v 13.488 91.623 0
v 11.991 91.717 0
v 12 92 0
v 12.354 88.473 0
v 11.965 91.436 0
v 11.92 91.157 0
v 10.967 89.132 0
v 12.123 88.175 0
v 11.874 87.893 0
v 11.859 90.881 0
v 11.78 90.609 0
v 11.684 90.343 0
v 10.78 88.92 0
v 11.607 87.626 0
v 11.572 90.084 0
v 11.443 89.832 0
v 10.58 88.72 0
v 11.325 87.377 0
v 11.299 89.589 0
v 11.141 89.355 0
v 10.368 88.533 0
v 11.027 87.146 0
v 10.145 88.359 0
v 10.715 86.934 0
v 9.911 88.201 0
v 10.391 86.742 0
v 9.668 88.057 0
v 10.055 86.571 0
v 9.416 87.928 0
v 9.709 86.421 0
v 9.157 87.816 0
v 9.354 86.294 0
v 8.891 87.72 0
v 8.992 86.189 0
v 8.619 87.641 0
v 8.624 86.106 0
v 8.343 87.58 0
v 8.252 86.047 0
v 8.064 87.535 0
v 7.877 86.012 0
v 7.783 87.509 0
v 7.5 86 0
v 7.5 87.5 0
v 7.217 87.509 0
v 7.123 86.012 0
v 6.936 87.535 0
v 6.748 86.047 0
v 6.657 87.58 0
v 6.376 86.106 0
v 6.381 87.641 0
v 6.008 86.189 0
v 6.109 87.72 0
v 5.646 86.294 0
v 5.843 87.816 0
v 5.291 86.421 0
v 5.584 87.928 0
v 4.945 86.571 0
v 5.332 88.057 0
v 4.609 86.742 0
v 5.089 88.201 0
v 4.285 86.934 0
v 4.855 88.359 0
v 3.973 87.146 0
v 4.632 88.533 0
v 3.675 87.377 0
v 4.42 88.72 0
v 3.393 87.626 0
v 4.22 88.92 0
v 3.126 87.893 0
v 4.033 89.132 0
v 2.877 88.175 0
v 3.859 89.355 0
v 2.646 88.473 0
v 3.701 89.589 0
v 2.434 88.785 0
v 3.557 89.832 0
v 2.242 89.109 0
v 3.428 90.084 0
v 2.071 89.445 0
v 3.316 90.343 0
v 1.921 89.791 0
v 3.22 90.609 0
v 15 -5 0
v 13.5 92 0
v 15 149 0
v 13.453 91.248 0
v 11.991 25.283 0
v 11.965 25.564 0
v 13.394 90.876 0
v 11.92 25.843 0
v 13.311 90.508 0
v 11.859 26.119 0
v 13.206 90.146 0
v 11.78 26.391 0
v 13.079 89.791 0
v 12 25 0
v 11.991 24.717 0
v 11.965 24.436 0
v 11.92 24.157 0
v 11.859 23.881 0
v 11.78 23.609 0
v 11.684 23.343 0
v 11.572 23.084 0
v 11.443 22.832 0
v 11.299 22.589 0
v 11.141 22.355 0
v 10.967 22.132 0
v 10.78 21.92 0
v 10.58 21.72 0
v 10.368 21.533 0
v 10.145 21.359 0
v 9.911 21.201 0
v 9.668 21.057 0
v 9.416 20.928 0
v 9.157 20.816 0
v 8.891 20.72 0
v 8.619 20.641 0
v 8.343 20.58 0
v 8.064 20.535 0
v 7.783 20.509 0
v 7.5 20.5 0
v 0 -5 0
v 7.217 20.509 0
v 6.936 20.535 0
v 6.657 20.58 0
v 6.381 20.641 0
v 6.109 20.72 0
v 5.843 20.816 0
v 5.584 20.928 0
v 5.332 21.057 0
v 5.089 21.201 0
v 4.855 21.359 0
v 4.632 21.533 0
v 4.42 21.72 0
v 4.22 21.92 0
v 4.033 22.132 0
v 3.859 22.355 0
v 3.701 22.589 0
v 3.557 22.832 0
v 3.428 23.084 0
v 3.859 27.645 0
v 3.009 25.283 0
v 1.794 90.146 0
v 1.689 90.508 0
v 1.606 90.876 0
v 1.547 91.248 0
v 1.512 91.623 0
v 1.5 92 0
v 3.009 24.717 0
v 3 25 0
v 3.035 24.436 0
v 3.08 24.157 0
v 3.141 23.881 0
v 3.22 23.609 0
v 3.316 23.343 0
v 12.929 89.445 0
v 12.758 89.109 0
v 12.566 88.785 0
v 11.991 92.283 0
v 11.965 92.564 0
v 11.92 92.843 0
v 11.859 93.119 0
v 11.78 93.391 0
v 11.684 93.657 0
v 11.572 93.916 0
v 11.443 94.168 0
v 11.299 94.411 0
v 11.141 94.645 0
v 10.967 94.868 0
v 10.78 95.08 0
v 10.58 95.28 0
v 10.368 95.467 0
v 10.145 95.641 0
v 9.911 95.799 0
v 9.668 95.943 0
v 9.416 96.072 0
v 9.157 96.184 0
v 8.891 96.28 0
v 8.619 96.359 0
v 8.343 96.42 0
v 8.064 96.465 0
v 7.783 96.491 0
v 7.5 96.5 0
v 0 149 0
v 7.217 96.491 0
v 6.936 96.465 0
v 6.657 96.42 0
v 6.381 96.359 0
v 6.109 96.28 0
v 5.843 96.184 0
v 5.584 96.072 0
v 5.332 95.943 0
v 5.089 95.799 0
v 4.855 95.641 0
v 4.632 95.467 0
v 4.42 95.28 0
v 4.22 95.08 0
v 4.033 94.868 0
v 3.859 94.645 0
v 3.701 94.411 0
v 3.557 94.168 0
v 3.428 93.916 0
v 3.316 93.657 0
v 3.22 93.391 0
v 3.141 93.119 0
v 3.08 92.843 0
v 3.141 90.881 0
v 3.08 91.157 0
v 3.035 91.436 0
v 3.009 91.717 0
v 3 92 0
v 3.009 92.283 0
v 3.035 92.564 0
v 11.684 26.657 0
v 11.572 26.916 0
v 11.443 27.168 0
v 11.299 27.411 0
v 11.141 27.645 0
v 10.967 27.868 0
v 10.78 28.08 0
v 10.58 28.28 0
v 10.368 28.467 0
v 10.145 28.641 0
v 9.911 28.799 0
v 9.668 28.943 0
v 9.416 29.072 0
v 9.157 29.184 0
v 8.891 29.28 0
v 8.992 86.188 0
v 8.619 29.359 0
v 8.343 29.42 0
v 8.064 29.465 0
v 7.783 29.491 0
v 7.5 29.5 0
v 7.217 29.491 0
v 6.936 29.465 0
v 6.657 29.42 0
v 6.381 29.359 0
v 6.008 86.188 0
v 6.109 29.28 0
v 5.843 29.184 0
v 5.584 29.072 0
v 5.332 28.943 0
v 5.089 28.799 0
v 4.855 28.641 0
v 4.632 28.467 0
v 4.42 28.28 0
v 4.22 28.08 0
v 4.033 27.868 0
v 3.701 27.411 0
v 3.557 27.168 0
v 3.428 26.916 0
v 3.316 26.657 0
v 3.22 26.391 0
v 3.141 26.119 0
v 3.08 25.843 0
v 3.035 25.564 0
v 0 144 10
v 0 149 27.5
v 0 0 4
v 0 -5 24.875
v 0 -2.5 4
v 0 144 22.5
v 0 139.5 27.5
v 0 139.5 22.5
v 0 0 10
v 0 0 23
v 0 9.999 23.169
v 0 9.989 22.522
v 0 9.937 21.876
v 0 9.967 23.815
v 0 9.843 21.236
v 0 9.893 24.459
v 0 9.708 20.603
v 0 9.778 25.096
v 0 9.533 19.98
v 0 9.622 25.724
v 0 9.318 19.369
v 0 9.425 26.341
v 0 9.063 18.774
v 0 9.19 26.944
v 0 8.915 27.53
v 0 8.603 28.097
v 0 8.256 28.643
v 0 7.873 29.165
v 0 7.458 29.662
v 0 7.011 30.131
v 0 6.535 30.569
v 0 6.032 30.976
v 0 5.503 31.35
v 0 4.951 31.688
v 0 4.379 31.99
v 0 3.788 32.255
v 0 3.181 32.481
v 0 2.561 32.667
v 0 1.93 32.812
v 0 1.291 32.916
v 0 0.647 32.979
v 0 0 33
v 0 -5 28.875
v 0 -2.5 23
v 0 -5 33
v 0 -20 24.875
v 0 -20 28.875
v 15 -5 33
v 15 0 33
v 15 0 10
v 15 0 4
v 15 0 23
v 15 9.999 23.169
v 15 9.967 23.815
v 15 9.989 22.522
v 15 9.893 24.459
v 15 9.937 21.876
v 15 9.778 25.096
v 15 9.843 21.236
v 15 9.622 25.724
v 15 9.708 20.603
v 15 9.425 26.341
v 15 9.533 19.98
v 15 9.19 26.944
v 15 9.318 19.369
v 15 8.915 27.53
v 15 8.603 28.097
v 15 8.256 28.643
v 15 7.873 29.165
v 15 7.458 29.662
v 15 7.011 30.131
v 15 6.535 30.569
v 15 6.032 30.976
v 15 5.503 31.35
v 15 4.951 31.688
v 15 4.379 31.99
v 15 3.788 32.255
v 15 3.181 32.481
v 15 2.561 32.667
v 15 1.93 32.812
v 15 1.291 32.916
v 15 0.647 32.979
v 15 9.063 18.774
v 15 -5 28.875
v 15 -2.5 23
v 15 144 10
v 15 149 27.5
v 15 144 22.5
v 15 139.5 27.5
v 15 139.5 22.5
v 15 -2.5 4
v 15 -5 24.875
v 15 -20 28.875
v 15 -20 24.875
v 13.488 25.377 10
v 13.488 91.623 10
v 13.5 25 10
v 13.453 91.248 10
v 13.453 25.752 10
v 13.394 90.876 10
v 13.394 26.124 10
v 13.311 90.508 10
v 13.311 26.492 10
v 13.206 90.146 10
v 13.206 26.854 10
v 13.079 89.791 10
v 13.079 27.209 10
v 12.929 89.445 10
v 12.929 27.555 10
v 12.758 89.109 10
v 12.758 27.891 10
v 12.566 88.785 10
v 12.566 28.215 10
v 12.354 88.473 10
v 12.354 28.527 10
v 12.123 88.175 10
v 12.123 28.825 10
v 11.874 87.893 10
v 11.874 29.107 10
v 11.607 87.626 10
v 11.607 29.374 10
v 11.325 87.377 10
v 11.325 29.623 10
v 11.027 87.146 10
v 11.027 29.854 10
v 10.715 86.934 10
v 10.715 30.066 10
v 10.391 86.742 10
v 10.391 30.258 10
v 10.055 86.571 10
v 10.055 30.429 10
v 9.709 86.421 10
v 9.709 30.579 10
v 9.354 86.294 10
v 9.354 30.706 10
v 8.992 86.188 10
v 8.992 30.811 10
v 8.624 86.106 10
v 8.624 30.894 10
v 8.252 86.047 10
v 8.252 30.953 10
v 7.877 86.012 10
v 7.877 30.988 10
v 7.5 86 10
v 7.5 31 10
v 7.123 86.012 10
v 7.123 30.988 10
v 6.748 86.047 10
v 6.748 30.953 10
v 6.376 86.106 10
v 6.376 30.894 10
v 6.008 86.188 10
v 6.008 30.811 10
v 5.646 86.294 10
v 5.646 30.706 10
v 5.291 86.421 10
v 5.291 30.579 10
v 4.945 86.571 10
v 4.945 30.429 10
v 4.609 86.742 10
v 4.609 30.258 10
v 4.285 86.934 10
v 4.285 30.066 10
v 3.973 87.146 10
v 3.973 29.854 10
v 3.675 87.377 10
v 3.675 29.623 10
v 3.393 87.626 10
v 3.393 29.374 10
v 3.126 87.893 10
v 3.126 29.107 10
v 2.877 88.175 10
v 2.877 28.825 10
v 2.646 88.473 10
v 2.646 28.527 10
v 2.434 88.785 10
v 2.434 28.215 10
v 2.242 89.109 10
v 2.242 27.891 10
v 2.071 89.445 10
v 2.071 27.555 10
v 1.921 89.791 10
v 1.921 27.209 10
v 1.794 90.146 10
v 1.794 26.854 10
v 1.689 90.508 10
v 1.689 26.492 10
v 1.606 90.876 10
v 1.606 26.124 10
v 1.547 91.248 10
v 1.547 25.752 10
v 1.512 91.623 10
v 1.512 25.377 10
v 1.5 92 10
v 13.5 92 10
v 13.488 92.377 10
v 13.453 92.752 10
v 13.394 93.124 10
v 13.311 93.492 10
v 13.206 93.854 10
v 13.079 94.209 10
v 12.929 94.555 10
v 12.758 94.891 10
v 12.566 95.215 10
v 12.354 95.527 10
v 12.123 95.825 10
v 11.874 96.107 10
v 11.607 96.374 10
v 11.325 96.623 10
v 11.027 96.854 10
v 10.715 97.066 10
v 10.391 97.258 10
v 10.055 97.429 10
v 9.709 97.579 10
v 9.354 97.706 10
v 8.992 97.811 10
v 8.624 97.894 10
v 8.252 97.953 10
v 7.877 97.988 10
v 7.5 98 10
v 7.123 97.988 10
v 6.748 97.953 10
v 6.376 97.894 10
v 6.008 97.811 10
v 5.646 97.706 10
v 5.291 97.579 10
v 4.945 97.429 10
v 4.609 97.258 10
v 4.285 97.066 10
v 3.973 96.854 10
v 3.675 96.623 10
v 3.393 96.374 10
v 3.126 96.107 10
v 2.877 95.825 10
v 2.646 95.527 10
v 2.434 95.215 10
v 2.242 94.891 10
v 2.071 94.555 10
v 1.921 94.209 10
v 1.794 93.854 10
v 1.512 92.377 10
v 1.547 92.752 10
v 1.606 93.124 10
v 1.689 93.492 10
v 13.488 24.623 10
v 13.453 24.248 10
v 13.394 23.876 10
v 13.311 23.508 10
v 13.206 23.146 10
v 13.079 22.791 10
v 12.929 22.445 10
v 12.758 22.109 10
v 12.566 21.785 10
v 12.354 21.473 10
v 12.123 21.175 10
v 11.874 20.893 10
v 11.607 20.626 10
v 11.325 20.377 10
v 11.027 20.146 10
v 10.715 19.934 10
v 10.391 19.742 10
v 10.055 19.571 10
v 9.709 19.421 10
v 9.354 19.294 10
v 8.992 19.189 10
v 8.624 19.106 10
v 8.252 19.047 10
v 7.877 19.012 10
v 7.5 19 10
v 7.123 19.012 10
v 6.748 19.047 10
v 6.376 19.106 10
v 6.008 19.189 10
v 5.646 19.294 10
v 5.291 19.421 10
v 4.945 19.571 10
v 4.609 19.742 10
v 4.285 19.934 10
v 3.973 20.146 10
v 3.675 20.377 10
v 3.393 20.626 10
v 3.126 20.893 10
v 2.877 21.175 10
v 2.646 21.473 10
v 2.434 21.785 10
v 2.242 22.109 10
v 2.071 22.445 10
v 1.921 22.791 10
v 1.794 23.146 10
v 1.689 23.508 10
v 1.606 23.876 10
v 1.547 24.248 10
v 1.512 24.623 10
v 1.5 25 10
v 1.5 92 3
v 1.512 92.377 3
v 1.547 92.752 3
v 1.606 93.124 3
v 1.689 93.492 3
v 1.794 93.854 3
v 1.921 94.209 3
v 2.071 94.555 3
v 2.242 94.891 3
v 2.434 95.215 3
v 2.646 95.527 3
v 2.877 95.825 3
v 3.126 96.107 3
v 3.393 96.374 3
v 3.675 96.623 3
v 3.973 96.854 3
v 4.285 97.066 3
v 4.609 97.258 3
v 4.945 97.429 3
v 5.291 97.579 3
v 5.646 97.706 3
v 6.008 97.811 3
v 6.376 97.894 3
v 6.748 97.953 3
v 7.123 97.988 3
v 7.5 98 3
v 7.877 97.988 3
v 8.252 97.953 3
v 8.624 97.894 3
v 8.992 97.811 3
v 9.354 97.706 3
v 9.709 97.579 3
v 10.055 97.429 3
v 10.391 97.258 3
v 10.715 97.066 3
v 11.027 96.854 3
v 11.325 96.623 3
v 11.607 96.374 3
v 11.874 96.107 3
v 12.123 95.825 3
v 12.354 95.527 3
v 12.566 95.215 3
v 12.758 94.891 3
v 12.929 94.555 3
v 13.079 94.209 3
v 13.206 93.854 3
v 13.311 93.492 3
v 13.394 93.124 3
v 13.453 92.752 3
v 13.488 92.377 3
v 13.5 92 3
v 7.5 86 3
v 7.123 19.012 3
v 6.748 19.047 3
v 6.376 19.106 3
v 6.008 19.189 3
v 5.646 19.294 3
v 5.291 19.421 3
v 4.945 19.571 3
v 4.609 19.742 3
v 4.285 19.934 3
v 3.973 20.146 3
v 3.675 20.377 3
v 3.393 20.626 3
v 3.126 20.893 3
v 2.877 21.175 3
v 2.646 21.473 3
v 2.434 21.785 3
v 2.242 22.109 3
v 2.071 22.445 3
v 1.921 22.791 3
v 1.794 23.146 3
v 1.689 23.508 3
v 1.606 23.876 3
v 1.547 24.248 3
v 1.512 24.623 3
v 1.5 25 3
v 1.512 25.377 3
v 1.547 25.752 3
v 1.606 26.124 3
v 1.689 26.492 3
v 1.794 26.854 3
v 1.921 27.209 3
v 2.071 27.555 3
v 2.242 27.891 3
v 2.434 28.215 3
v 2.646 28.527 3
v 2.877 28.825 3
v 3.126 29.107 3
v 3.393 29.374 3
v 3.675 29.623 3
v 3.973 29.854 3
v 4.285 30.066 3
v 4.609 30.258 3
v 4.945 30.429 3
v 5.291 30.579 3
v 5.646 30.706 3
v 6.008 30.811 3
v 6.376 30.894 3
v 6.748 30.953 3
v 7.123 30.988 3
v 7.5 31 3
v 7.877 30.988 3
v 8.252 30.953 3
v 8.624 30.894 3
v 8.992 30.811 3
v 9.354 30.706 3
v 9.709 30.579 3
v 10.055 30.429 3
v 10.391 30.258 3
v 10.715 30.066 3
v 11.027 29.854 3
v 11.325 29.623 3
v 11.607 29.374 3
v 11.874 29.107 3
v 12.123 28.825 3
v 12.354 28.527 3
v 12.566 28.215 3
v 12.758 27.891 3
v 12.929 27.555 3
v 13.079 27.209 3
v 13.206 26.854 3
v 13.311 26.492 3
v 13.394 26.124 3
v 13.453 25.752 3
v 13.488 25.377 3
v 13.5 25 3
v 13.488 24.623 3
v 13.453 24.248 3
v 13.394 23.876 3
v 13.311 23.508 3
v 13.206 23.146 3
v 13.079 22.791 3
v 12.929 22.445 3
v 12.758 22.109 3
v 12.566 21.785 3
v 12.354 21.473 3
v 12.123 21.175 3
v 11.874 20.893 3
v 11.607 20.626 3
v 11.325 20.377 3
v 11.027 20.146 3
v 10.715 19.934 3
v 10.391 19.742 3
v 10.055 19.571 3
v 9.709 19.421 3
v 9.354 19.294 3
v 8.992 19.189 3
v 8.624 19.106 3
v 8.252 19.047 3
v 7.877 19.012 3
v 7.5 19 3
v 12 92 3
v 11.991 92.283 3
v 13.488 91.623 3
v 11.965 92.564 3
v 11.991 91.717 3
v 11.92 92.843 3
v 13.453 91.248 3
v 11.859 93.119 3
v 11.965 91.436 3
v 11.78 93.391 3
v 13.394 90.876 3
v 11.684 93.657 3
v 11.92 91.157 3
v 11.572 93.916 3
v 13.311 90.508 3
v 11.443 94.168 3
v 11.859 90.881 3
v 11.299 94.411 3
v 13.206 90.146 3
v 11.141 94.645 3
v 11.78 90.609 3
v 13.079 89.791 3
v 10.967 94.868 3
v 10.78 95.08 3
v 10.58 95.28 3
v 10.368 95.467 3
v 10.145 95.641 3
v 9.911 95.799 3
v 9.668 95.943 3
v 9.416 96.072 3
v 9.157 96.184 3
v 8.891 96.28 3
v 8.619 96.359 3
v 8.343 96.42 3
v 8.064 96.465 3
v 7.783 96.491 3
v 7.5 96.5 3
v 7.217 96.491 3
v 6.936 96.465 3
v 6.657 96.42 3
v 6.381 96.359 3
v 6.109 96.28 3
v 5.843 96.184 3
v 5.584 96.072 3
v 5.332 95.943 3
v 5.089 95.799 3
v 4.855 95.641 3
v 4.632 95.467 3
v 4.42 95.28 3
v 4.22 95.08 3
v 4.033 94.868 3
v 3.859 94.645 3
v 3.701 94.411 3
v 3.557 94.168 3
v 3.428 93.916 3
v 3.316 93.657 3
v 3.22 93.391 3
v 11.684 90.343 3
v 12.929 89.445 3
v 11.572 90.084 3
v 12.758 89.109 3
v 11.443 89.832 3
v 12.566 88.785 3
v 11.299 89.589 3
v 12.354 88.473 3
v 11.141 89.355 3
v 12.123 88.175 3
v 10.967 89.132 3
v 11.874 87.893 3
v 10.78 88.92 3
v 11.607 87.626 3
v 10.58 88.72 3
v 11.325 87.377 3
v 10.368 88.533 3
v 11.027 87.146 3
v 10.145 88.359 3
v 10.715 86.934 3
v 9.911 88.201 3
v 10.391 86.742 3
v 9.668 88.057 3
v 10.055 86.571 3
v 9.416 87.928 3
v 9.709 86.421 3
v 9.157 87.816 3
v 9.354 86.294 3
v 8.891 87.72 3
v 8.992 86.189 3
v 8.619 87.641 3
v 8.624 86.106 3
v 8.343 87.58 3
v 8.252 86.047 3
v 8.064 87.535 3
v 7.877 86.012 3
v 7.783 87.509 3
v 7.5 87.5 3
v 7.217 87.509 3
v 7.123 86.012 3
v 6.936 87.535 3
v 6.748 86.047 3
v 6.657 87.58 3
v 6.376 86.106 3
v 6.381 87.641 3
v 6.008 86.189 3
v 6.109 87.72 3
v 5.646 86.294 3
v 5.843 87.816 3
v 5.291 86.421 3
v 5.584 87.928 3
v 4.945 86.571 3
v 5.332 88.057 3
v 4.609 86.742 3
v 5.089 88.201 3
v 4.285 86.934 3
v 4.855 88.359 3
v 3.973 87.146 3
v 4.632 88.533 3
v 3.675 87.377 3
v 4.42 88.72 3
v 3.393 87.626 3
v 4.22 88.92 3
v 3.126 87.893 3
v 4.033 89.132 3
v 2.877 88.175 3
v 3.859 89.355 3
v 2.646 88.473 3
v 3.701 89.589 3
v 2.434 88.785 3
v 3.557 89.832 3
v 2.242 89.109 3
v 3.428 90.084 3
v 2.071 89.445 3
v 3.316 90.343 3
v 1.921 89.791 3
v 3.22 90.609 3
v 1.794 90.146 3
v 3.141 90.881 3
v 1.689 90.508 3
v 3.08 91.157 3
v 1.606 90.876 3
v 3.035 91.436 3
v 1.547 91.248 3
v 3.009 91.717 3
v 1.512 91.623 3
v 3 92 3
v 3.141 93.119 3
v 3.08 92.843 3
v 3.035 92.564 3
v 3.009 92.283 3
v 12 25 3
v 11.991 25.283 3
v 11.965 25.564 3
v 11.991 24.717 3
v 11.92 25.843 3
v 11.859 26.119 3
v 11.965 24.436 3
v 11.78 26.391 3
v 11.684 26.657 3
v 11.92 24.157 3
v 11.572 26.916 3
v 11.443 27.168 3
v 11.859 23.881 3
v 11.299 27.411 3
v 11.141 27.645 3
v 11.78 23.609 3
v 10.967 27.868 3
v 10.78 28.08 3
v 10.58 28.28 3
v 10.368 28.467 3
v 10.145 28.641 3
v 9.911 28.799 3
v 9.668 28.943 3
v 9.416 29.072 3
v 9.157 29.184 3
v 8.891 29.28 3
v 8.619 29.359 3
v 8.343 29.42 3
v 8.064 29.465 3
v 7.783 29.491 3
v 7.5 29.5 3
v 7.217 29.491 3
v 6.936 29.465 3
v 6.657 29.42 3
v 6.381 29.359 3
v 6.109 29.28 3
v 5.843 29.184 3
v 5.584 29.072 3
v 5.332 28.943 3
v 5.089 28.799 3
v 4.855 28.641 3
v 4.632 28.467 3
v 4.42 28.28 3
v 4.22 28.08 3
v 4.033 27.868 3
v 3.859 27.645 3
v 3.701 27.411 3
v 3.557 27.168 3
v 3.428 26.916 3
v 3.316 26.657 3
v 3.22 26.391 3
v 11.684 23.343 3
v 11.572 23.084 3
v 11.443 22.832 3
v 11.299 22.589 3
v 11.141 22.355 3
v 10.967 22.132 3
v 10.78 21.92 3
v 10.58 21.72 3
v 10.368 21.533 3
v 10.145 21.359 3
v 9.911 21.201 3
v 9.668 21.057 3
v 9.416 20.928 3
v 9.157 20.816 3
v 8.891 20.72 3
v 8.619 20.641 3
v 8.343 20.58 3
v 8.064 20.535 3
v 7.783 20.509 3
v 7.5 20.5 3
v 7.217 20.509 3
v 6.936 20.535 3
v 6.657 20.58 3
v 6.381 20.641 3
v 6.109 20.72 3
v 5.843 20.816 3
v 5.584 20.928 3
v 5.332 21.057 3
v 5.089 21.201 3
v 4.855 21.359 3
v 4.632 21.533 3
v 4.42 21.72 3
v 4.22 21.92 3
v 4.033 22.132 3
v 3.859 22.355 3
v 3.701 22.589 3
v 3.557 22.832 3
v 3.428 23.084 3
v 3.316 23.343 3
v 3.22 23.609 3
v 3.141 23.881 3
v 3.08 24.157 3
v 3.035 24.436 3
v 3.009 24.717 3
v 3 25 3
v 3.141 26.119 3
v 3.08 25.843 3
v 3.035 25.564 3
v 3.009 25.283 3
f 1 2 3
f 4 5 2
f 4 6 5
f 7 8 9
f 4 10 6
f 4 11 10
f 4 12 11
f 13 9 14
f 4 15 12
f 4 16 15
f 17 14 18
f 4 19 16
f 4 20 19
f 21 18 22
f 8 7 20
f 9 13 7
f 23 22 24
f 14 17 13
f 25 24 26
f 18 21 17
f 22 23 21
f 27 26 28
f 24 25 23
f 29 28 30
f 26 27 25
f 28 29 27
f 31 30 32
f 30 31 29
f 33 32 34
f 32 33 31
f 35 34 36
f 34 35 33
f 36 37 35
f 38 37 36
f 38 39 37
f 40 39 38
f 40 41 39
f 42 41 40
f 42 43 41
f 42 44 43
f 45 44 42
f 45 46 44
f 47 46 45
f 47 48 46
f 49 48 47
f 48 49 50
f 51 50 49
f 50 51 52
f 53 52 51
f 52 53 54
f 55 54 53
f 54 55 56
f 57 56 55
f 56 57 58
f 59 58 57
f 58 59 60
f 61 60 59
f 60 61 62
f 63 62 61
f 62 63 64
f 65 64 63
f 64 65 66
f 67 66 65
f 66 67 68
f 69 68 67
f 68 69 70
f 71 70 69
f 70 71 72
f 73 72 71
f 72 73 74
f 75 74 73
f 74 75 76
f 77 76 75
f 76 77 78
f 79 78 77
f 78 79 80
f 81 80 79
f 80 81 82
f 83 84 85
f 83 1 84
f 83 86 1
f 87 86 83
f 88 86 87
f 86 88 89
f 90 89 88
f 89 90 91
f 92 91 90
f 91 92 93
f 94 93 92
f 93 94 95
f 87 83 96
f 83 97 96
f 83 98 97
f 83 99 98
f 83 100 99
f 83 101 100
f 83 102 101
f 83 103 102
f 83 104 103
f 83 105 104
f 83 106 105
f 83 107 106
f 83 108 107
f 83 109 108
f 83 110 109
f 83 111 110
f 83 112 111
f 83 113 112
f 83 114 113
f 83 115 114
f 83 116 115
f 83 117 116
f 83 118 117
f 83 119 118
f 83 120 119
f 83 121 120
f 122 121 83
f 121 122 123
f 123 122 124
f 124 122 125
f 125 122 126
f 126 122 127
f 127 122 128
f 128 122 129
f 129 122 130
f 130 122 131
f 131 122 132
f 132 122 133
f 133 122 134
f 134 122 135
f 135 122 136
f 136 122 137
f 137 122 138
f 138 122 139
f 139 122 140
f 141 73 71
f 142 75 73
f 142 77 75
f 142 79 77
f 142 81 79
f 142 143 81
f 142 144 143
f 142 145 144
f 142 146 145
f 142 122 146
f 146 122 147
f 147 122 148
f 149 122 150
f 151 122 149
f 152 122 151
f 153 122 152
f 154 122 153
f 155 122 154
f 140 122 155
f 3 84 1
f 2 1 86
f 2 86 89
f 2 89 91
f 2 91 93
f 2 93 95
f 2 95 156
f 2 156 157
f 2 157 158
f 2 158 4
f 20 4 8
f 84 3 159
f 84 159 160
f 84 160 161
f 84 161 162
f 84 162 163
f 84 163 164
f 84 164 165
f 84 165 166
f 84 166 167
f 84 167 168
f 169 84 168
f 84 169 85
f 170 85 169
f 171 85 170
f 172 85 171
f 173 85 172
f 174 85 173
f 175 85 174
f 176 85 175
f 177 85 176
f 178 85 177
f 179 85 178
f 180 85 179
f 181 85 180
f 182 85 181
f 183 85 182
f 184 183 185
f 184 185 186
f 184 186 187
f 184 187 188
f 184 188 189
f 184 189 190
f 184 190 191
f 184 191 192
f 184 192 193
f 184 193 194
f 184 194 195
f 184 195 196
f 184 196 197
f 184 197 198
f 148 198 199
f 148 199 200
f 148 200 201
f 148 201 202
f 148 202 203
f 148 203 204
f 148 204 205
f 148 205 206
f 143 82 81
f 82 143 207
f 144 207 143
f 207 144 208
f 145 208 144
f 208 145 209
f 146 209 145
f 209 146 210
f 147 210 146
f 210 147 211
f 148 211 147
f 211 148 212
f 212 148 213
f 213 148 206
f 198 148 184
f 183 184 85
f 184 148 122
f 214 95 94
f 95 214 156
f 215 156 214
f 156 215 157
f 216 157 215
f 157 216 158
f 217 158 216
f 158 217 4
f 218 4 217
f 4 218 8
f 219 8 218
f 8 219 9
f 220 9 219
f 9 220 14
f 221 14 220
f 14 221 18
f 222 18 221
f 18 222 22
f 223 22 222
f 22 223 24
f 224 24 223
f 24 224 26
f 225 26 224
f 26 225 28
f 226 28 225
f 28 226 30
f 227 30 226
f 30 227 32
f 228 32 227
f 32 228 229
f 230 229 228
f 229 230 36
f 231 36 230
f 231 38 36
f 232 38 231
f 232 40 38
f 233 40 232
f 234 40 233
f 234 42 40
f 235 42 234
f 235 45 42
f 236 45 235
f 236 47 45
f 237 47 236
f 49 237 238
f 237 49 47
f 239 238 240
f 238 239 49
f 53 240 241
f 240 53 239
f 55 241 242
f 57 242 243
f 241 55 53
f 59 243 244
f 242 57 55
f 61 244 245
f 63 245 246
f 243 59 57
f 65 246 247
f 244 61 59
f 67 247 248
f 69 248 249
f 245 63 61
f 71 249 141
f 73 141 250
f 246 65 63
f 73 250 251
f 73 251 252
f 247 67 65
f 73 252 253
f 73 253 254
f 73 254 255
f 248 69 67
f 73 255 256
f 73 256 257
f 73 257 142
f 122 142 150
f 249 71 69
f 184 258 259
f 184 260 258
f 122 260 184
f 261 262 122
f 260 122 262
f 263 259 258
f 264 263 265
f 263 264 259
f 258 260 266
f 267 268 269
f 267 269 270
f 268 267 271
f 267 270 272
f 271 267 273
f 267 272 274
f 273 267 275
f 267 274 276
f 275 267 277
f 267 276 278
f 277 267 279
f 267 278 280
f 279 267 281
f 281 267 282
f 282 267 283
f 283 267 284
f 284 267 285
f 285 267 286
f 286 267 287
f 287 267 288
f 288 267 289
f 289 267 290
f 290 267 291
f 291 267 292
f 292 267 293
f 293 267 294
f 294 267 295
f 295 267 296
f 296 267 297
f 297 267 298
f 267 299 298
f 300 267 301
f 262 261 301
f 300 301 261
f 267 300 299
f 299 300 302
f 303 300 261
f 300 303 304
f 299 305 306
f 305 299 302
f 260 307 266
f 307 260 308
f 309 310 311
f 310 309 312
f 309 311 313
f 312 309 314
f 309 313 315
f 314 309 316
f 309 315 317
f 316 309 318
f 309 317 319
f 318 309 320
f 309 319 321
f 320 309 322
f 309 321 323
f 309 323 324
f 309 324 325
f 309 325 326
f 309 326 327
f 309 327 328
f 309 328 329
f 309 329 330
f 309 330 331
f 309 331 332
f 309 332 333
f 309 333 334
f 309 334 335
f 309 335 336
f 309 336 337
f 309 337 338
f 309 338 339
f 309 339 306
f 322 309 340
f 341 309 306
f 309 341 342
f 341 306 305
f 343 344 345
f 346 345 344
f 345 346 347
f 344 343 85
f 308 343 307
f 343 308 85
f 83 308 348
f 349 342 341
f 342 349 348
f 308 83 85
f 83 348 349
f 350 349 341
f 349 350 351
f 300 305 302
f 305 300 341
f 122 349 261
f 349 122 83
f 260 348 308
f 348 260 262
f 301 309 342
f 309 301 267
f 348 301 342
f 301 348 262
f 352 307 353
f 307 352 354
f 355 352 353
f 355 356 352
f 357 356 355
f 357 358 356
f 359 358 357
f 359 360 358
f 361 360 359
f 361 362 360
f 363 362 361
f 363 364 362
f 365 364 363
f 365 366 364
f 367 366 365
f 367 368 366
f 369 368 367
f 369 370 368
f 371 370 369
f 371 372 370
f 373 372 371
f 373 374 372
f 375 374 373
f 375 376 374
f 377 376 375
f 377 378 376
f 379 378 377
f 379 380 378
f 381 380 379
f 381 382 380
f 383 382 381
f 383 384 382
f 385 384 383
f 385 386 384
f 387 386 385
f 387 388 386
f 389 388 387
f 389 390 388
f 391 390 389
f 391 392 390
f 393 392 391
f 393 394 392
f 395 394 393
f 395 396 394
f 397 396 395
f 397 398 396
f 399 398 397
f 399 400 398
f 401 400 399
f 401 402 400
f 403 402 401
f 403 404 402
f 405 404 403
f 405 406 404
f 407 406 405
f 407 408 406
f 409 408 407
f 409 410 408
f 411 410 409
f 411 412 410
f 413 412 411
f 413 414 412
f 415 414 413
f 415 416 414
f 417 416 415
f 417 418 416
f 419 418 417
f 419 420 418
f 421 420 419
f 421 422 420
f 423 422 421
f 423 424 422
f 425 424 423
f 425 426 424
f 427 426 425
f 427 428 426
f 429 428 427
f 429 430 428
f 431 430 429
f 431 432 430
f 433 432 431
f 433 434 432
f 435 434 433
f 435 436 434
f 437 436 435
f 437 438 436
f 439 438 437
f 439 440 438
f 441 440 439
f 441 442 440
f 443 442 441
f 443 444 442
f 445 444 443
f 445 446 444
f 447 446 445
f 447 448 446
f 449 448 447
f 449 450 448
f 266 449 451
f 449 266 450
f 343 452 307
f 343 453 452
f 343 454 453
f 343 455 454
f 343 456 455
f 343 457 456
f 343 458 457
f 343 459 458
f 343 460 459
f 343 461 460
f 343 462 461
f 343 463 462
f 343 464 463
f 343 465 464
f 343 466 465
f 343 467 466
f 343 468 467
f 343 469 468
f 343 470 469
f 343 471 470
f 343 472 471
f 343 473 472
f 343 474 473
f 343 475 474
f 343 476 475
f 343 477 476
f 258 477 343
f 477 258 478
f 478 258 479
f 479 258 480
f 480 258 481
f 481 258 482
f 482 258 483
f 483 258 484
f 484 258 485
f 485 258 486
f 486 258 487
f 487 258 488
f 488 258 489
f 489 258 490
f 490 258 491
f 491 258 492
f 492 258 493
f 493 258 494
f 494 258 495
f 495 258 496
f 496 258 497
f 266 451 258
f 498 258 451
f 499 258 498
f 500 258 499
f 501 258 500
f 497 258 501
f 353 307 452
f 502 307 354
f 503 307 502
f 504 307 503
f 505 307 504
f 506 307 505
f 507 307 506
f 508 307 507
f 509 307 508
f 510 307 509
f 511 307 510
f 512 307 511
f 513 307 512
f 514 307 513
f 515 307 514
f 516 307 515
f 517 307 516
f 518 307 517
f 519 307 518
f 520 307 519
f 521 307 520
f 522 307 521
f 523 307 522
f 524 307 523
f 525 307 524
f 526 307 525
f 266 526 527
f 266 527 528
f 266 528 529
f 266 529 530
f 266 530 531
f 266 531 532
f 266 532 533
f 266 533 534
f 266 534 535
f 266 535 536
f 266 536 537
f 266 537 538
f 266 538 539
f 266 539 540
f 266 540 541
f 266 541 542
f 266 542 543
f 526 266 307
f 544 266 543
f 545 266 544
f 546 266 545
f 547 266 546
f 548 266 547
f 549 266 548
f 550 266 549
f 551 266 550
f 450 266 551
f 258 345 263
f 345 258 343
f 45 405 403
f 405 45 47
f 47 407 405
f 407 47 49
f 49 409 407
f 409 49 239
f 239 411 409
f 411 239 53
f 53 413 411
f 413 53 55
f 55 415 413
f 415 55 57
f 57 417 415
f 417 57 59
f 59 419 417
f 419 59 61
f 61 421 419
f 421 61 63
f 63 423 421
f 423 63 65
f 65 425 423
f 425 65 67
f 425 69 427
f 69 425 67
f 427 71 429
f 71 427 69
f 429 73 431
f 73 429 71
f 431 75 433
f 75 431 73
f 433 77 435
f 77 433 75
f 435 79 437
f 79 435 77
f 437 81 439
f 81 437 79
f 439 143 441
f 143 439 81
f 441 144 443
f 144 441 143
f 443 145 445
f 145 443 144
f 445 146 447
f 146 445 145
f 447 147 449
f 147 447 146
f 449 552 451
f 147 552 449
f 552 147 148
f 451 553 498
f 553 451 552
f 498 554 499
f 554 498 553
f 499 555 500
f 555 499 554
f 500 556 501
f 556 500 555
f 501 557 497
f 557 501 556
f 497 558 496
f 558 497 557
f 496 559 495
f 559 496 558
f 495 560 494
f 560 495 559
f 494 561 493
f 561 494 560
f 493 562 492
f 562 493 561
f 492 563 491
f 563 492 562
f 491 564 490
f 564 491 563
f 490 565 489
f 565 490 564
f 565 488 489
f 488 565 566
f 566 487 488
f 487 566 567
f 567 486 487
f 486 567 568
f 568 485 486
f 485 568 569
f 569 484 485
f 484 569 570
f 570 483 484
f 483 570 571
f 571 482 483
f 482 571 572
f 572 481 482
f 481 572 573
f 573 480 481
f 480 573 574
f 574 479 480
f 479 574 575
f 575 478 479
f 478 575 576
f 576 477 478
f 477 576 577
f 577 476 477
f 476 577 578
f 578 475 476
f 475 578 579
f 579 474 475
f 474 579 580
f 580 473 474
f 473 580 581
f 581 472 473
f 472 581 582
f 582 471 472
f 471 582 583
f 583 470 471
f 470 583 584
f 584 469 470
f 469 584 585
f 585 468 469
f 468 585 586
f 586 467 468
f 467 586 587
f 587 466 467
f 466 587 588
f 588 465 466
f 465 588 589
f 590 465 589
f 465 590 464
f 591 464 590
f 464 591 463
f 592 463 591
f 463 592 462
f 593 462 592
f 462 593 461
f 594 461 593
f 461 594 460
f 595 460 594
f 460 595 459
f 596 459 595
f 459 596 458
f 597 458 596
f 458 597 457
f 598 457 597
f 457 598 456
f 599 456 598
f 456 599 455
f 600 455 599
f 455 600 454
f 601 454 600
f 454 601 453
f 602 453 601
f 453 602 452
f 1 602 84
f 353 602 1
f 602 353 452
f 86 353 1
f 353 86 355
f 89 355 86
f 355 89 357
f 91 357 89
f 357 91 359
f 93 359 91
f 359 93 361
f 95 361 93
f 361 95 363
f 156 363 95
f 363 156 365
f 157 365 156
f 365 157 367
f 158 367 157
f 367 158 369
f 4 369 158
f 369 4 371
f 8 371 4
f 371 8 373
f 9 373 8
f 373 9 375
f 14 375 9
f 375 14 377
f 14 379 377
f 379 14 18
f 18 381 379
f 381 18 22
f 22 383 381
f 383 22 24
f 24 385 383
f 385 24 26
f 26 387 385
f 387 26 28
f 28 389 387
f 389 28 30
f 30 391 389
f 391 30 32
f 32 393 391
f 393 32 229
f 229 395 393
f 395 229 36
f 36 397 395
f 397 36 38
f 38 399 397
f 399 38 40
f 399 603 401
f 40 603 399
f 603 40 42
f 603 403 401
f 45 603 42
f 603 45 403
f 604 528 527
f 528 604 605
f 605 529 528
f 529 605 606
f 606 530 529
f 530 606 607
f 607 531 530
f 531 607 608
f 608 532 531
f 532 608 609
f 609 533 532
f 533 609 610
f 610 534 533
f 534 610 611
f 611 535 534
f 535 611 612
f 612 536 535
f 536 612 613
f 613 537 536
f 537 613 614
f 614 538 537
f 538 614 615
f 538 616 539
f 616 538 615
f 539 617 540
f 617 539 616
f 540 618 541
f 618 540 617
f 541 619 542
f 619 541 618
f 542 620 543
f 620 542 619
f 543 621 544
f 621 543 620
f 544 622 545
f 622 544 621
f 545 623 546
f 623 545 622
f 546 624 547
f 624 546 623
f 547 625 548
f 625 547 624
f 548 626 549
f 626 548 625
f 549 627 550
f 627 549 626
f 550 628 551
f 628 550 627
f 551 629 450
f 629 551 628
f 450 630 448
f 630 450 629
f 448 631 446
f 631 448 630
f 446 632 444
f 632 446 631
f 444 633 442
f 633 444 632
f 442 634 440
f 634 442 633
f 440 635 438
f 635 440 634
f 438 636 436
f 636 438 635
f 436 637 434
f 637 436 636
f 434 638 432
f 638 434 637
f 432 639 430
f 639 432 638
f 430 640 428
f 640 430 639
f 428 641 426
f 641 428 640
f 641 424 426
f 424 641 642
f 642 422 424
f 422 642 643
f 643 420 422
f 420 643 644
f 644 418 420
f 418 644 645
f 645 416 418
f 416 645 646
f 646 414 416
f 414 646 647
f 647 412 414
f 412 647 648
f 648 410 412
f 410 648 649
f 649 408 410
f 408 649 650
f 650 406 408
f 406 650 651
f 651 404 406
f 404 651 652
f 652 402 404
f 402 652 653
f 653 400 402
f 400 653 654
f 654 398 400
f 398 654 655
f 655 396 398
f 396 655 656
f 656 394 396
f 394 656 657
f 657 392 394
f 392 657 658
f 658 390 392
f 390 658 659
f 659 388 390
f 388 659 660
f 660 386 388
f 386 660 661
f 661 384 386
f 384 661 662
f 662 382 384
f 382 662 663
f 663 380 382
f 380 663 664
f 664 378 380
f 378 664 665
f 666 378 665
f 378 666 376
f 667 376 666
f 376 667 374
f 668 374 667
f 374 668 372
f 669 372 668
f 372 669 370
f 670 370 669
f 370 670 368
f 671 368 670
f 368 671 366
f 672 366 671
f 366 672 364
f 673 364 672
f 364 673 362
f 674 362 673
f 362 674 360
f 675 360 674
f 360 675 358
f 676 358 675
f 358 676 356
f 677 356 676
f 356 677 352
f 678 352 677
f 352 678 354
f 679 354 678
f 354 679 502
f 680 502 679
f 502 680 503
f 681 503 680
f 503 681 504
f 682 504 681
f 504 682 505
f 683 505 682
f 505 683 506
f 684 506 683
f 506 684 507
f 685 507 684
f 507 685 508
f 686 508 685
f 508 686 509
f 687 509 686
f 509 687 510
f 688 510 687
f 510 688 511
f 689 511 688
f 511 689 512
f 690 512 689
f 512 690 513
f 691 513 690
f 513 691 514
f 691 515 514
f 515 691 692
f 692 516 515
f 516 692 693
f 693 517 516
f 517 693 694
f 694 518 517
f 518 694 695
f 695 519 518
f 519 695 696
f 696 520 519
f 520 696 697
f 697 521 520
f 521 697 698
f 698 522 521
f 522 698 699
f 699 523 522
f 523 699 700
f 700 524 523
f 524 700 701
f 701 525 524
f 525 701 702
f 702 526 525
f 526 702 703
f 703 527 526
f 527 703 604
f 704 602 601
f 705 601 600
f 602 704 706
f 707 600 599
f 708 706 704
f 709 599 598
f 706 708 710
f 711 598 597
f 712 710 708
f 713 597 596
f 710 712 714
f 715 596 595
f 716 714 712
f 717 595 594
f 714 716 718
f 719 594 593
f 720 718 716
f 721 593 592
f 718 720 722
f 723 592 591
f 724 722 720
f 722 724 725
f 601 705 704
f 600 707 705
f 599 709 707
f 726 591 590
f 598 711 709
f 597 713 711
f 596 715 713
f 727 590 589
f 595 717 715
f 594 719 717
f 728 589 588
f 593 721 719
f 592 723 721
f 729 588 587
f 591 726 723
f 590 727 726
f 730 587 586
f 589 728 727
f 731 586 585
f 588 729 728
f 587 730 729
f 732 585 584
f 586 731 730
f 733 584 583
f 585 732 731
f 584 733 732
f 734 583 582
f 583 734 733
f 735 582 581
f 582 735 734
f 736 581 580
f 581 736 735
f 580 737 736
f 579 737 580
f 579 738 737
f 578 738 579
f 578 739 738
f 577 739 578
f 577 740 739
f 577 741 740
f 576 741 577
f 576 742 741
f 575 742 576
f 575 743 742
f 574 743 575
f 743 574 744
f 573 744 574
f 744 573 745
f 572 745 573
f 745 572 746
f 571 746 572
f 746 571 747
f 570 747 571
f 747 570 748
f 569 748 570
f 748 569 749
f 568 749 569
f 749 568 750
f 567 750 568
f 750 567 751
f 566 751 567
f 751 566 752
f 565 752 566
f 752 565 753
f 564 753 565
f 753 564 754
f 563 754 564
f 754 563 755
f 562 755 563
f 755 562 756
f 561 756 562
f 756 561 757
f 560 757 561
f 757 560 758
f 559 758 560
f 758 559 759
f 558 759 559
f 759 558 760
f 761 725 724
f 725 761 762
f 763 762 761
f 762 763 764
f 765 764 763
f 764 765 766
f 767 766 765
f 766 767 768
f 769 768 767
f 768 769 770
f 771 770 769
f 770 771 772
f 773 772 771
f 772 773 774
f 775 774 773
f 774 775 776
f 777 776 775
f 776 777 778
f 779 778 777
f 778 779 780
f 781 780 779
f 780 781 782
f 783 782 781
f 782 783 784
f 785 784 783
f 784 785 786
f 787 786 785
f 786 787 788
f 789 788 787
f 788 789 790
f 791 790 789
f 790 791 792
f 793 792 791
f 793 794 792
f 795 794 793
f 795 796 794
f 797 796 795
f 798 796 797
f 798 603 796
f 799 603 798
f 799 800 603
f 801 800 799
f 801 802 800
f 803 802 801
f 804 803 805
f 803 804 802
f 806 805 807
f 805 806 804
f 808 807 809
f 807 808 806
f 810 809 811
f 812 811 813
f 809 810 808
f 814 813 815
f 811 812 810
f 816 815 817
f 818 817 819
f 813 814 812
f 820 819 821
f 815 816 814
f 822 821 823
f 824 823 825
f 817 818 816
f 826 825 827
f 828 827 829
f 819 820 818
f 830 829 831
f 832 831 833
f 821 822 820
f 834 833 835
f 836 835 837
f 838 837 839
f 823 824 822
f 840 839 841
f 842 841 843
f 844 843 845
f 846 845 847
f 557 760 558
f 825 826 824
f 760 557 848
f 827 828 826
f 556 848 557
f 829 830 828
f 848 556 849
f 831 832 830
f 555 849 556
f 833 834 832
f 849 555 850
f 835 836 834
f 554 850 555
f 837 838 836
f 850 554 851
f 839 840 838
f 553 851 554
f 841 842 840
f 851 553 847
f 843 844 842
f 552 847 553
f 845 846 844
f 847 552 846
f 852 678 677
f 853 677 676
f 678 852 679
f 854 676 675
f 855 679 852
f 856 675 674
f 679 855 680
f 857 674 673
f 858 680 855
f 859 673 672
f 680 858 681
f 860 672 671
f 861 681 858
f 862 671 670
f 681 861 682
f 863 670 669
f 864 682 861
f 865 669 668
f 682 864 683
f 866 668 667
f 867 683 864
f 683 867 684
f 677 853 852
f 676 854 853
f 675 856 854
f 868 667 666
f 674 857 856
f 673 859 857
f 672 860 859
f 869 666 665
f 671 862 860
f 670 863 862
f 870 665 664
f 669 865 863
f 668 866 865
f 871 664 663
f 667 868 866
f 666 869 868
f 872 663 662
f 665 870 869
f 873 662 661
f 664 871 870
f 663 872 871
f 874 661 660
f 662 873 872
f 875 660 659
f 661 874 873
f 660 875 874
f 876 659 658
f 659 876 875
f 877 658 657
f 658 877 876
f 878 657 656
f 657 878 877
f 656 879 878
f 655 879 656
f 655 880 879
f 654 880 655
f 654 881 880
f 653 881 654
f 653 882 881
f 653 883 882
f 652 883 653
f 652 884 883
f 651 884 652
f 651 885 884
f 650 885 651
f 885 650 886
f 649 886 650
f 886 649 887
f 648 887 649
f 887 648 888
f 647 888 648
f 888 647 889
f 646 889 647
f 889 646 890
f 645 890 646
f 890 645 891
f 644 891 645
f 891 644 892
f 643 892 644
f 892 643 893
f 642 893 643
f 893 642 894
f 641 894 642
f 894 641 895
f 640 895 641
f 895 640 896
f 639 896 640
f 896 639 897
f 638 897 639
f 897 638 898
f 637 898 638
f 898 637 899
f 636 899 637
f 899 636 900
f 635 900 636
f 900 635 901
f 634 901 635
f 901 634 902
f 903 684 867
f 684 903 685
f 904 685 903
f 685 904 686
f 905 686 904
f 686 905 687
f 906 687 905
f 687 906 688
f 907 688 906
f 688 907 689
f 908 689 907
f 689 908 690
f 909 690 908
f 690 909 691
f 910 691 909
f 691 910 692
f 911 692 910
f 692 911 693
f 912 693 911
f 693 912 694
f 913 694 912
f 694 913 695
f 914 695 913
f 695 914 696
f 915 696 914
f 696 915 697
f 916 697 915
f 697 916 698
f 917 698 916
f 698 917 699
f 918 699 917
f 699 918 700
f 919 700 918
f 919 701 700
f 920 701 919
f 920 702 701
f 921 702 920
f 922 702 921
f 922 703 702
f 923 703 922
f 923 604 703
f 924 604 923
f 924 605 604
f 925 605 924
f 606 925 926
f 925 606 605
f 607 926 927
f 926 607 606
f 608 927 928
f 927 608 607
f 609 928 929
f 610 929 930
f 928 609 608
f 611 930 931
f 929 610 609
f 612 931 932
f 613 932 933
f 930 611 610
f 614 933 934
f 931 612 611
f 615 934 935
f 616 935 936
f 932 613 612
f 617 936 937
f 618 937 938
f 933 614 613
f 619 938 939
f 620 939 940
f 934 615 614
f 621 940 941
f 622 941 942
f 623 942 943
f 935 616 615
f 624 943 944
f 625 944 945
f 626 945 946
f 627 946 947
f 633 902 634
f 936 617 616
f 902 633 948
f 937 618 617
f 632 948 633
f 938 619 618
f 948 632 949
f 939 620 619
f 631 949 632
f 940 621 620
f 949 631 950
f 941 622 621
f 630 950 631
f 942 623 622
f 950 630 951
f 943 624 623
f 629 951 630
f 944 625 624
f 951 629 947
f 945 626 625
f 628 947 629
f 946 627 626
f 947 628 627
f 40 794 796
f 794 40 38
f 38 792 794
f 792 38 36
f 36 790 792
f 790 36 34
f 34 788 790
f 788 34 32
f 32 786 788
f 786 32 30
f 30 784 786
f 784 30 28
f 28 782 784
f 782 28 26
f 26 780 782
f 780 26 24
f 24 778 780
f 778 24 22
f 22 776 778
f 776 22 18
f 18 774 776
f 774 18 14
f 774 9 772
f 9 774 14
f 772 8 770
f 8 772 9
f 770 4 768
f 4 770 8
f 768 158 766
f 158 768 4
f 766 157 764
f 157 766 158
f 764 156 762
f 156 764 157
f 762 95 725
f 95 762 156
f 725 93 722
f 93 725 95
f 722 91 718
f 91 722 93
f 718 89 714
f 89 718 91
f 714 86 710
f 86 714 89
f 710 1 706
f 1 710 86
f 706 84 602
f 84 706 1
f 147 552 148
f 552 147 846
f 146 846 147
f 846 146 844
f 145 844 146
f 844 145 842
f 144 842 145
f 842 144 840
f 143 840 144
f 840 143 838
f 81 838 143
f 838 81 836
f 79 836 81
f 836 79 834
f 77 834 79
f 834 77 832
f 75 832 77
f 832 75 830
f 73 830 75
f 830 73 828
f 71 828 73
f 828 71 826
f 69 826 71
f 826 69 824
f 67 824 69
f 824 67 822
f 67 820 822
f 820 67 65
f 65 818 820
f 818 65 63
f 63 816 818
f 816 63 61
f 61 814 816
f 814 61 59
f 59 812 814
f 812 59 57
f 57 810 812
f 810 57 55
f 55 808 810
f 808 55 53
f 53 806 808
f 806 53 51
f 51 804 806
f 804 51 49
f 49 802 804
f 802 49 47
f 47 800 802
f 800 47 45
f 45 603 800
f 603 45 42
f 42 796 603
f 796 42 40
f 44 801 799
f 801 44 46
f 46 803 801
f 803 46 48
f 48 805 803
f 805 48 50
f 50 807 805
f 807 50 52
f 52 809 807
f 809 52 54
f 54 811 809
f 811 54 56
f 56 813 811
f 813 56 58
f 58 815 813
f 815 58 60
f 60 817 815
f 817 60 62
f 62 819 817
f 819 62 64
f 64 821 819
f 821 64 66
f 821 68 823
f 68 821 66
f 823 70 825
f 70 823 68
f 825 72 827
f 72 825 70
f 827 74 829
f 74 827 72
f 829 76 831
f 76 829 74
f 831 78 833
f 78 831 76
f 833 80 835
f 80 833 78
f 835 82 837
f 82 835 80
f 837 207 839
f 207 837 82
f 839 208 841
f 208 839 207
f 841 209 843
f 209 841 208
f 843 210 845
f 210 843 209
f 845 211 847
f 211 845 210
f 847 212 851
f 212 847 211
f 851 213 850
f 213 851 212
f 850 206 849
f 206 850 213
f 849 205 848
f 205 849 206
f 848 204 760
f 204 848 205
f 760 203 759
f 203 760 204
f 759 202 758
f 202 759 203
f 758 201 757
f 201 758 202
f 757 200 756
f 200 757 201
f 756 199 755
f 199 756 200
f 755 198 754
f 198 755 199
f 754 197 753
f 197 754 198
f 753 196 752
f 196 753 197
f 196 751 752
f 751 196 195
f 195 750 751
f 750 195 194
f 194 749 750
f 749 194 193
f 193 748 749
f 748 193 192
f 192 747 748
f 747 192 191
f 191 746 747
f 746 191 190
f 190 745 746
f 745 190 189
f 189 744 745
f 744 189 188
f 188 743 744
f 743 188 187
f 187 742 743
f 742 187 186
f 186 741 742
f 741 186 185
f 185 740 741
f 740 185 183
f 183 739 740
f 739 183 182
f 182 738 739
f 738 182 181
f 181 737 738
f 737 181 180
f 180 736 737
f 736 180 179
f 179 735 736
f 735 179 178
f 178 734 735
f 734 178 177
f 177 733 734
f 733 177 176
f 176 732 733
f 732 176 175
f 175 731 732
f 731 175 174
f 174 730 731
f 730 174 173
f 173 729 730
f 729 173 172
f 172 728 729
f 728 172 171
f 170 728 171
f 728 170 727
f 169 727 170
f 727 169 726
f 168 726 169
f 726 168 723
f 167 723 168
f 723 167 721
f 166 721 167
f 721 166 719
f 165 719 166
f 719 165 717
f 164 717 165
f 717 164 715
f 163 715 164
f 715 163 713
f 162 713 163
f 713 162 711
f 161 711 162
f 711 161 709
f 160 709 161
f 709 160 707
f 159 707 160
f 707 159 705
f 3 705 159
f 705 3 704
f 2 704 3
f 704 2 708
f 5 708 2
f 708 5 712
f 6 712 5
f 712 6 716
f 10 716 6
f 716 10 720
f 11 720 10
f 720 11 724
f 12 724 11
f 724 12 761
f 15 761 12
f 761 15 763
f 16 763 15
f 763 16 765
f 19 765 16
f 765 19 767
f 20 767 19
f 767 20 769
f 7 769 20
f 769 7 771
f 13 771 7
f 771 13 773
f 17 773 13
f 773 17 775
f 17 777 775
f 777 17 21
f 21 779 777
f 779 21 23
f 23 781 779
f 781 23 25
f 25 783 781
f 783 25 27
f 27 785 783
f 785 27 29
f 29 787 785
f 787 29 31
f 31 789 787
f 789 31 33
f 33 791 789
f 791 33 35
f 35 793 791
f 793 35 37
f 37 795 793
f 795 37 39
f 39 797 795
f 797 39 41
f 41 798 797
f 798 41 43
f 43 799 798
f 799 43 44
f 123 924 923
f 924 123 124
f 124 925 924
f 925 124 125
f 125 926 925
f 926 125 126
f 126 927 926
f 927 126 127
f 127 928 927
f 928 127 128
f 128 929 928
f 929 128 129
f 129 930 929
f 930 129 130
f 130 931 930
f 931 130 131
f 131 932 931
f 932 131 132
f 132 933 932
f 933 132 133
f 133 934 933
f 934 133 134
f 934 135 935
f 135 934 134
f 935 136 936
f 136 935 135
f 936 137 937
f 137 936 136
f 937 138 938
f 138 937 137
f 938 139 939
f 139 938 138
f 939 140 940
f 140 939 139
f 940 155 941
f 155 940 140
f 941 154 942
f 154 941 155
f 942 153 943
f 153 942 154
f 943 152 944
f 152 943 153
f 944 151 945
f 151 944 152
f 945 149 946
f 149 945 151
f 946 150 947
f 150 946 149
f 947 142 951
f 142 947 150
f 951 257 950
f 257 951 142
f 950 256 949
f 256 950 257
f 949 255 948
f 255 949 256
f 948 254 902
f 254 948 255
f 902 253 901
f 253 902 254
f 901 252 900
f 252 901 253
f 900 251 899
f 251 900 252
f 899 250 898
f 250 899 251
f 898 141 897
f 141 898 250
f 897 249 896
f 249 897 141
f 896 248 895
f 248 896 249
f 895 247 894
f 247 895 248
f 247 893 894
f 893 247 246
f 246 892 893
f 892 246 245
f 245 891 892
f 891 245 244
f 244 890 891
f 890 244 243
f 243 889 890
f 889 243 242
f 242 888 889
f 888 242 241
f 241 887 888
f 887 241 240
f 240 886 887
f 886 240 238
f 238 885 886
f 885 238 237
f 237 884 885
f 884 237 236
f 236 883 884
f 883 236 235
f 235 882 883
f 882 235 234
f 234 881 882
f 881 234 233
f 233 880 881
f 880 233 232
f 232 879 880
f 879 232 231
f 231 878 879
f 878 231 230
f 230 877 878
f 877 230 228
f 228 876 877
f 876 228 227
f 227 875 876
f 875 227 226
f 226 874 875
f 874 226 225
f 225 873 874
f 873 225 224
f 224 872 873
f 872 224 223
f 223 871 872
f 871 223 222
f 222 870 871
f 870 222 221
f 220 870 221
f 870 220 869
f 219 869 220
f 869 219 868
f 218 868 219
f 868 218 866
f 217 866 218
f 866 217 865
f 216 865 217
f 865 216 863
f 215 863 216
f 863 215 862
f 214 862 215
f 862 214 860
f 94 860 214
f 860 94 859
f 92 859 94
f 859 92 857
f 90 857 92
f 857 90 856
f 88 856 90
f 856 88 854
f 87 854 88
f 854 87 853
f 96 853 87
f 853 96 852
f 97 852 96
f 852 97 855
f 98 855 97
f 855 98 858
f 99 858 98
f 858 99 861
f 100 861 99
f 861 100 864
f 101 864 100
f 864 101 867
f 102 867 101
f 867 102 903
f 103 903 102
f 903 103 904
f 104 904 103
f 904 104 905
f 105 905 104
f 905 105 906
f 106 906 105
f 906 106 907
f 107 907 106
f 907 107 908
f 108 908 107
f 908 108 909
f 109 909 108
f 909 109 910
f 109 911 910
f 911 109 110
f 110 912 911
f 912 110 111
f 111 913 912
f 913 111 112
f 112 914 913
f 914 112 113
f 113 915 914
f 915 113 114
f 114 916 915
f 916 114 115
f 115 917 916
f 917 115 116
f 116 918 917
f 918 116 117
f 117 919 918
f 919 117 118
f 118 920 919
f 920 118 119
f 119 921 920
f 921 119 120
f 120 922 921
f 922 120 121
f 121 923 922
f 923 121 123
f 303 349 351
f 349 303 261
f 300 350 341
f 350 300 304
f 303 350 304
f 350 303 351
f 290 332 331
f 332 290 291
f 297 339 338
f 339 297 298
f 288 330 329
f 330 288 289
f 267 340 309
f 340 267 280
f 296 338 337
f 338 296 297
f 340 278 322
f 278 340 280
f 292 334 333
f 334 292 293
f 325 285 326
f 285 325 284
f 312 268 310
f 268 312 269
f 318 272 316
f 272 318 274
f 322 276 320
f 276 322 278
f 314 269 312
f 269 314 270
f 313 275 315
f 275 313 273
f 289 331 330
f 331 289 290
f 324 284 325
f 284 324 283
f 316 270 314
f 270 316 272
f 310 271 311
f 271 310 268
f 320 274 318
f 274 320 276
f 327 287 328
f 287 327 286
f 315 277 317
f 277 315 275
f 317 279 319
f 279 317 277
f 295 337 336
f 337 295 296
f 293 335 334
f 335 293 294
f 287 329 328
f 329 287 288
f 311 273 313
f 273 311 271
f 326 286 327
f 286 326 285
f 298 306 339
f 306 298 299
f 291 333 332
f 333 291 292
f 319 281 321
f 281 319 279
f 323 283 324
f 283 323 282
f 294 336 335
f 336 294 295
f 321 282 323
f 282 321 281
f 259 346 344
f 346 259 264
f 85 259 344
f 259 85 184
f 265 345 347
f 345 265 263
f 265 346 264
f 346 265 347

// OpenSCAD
$fn=100;

/*
Can holder MTB

Tested w/

Infill: 40%
*/

/*
Normal 12oz can: 122
Keystone 12oz: 133
Yerba Mate: 15.5 oz
Red Bull: 8.4oz: 136

*/
can_height=136 + 8; // 12.cm
base_width=15; // 2cm
base_depth=10; // 1cm
screw_small_depth = 3;
screw_thread_diameter = 9;
bolt_head_diameter=12; //6mm for M5 bolt
dist_between_holes=55; // 2.14inch / 64mm
hole_offset=25; // 2cm from origin
bottom_lip_height=4.5; // 4.5mm 2cm (1cm + xyz)
bottom_lip_thickness=5; // 5mm
bottom_lip_base=5; // 10mm
bottom_lip_extrusion=12.5 + base_depth; // 10.5mm
upper_lip_base=5;
upper_lip_thickness=23 + base_depth; // height basically
upper_pushness_thickness=4; 
upper_pusher_base=15;
upper_can_hook_height=10;
upper_can_hook_base=5;
upper_can_hook_width=5;
upper_hook_radius=10;
upper_lip_difference=2.50;

/*
translate([-20,120,base_depth-2]) {

rotate([64,0,20]){

color([1,0,0]) {

import("soda_can.stl");
}
}

}
*/


// Distance from tip to base should 7.5mm
// Distance from tip to left face 6 mm

module pieSlice(a, r, h){
  // a:angle, r:radius, h:height
  rotate_extrude(angle=a) square([r,h]);
}

linear_extrude(base_depth) {
    difference() {
        difference(){
            square([base_width, can_height]);
            translate([base_width/2,hole_offset,0]){
                circle(d=bolt_head_diameter);
                translate([0,(bolt_head_diameter)+dist_between_holes,0]) {
                    circle(d=bolt_head_diameter);
                }
            }
        }
    }
}


linear_extrude(screw_small_depth) {
            translate([base_width/2,hole_offset,0]){
                difference() {
                circle(d=bolt_head_diameter);
                    circle(d=screw_thread_diameter);
                }
            translate([0,(bolt_head_diameter)+dist_between_holes,0]) {
                difference() {
                    circle(d=bolt_head_diameter);
                    circle(d=screw_thread_diameter);
                }
                }
            }
}

// Upper Lip
difference(){
linear_extrude(upper_lip_thickness){
translate([0,-upper_lip_base,0]) {
    square([base_width,upper_lip_base]);
}
}

translate([-2.5,-upper_lip_difference,base_depth/2.5]) {
    linear_extrude(upper_lip_thickness-10-(base_depth/2.5)){
    square([base_width+5,upper_lip_difference]);
    }
}
}

// Upper Lip Pusher (?)
translate([0,0,(upper_lip_thickness*7/8)-upper_pushness_thickness]){
linear_extrude(upper_pushness_thickness){
translate([0,-upper_pusher_base-upper_lip_base,0]) {
    square([base_width,upper_pusher_base]);
}
}
}

// Upper Lip Hook (?)
/*
translate([0,0,(upper_lip_thickness-upper_can_hook_height)]){
linear_extrude(upper_can_hook_height){
translate([0,,0]) {
    square([base_width,upper_can_hook_base]);
}
}
}
*/

translate([base_width,0,upper_lip_thickness-10]){
rotate([0,-90,0]){
pieSlice(90+25,upper_hook_radius,base_width);
}
}

// Bottom Lip

linear_extrude((bottom_lip_extrusion) + bottom_lip_thickness) {
    translate([0,can_height,0]) {
        square([base_width,bottom_lip_base]);
    }
}

translate([0,can_height-bottom_lip_height,(bottom_lip_extrusion)]) {
    linear_extrude(bottom_lip_thickness){
    square([base_width,bottom_lip_height]);
    }
}
/*
translate([10,0,30]){
rotate([360-90,45,0]){
pieSlice(90, 30, 30);
}
}\*/
